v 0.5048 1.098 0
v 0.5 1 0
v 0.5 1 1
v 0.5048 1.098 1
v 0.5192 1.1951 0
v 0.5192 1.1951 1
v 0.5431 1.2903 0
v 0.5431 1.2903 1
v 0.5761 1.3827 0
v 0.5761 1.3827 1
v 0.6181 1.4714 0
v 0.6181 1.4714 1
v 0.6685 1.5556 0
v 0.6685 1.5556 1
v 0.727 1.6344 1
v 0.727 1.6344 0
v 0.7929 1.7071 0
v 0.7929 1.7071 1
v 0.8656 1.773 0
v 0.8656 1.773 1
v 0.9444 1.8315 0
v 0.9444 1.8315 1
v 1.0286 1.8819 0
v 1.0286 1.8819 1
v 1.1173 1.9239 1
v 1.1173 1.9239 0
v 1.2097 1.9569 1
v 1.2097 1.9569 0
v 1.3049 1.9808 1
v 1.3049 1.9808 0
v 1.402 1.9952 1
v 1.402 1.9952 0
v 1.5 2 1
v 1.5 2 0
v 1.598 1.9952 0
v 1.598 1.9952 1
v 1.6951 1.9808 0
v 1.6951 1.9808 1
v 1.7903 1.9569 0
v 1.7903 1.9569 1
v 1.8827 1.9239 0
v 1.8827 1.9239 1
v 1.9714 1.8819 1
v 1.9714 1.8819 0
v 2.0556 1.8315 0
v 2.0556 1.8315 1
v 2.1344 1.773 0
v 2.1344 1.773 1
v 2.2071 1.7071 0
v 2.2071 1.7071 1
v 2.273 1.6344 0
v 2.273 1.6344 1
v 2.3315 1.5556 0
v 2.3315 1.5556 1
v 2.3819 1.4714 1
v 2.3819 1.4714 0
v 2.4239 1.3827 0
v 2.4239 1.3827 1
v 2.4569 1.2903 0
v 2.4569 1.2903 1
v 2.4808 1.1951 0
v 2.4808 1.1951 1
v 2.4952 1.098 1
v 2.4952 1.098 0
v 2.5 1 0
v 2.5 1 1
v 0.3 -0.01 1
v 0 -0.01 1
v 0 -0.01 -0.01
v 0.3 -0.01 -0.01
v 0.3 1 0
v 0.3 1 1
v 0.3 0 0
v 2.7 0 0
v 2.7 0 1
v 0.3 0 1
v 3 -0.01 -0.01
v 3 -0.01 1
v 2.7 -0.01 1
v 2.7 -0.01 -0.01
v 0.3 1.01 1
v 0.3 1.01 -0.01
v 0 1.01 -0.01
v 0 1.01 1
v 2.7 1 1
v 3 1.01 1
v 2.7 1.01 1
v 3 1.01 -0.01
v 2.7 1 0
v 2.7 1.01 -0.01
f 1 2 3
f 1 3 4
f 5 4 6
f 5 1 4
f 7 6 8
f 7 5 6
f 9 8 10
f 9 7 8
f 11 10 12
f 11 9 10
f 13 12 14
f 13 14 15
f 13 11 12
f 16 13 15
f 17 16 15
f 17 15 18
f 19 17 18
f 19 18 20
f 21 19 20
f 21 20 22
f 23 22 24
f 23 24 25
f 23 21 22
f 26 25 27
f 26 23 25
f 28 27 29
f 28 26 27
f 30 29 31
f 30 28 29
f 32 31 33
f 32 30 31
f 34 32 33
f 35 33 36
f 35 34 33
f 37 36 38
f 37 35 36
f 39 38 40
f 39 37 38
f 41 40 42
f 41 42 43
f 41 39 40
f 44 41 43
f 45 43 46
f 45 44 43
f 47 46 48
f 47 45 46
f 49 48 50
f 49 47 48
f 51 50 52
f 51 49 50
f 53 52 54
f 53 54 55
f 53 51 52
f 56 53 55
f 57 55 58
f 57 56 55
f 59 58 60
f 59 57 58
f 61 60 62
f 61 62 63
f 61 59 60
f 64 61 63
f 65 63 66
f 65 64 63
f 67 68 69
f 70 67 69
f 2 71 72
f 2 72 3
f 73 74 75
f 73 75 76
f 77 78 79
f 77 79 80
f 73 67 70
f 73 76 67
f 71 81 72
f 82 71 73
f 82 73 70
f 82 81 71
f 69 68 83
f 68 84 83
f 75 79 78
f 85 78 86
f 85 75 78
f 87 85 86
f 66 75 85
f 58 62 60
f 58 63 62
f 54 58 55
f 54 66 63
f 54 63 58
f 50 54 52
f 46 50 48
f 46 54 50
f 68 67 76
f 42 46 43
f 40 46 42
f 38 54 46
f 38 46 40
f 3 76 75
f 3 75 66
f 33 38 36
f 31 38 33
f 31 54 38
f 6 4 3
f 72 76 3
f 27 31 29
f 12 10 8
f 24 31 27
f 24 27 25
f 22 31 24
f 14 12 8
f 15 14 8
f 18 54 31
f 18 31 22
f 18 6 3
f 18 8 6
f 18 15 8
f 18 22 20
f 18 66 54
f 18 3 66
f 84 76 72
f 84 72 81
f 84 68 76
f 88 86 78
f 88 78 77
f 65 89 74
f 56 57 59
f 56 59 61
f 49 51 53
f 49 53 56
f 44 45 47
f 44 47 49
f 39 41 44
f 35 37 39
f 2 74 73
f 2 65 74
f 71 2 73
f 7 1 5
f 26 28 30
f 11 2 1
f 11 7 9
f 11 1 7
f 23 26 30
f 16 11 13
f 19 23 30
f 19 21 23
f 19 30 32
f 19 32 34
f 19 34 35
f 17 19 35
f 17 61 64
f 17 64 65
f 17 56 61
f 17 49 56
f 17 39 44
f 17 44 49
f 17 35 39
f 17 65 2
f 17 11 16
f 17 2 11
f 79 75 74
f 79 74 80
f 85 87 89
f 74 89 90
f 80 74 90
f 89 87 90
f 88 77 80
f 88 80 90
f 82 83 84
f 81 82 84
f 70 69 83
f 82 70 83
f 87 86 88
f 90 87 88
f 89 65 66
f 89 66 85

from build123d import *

# Parameters (mm, degrees)
EXTRUDE_1_DEPTH = 1
SKETCH_3_W      = 1.01
SKETCH_3_H      = 1.02
EXTRUDE_2_DEPTH = 0.3
EXTRUDE_3_DEPTH = 0.3


with BuildPart() as part:
    # 草图1 → 凸台-拉伸1 (new body)
    with BuildSketch(Plane.XY):
        with BuildLine():
            Line((2.5, 1), (3, 1))
            Line((3, 1), (3, 0))
            Line((3, 0), (0, 0))
            Line((0, 0), (0, 1))
            Line((0, 1), (0.5, 1))
            ThreePointArc((0.5, 1), (1.5, 2), (2.5, 1))
        make_face()
    extrude(amount=EXTRUDE_1_DEPTH)

    # 草图3 → 凸台-拉伸2 (add)
    with BuildSketch(Plane(origin=(3, 0, 0), x_dir=(0, 0, -1), z_dir=(1, 0, 0))):
        with Locations((-0.495, 0.5)):
            Rectangle(SKETCH_3_W, SKETCH_3_H)
    extrude(amount=-EXTRUDE_2_DEPTH)

    # 草图4 → 凸台-拉伸3 (add)
    with BuildSketch(Plane.ZY):
        Polygon((-0.01, -0.01), (-0.01, 1.01), (1, 1.01), (1, 0), (1, -0.01), align=None)
    extrude(amount=-EXTRUDE_3_DEPTH)


solid = part.part
